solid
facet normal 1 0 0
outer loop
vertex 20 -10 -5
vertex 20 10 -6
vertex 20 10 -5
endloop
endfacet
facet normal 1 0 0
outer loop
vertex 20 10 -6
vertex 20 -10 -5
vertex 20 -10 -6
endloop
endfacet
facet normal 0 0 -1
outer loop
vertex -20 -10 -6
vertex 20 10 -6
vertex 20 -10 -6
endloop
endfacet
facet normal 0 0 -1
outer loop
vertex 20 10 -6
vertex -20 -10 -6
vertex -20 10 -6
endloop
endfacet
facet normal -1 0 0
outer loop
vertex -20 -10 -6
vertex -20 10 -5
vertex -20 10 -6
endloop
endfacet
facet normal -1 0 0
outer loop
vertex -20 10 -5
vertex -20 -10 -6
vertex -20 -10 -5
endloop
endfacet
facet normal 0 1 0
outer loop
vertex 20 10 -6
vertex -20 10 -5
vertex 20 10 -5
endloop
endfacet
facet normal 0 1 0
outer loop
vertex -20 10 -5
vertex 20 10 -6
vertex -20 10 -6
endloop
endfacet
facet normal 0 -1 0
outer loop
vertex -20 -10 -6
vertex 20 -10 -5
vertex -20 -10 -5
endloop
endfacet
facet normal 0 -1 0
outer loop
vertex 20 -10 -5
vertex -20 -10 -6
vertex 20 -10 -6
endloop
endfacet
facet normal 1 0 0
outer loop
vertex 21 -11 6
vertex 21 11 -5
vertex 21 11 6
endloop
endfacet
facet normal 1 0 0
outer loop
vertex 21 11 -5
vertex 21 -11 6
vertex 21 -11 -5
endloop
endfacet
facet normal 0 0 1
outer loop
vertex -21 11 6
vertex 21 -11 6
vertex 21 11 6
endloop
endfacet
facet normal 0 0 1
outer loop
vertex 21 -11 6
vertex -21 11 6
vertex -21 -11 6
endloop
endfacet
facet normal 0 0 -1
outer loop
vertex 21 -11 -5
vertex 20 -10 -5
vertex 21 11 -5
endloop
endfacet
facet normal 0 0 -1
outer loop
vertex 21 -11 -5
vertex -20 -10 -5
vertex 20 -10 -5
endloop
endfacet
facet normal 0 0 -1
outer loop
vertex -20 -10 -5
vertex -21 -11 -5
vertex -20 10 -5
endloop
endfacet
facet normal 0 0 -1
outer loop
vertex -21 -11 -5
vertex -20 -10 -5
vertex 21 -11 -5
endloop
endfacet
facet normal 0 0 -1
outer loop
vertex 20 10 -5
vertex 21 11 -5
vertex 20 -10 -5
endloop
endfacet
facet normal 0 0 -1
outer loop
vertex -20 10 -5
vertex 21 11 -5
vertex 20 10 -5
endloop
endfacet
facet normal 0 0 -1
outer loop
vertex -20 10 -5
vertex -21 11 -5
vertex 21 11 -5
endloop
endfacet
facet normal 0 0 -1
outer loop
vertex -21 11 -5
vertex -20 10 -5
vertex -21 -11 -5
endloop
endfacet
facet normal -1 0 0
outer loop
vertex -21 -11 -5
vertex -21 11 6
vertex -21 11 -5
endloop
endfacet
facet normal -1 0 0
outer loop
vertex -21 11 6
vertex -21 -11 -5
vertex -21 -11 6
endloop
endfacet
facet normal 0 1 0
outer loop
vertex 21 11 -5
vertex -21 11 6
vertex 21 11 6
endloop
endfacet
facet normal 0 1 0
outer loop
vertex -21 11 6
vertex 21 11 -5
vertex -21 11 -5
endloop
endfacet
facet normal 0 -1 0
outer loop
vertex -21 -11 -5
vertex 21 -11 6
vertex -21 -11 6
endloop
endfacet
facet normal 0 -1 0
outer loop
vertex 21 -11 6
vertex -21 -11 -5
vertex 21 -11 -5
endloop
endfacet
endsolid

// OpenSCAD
// Unit of length: Unit.MM
union()
{
   color(c = [1.0, 0.0, 0.0, 1.0])
   {
      translate(v = [0.0, 0.0, -0.5])
      {
         cube(size = [40.0, 20.0, 11.0], center = true);
      }
   }
   translate(v = [0.0, 0.0, 0.5])
   {
      cube(size = [42.0, 22.0, 11.0], center = true);
   }
}
